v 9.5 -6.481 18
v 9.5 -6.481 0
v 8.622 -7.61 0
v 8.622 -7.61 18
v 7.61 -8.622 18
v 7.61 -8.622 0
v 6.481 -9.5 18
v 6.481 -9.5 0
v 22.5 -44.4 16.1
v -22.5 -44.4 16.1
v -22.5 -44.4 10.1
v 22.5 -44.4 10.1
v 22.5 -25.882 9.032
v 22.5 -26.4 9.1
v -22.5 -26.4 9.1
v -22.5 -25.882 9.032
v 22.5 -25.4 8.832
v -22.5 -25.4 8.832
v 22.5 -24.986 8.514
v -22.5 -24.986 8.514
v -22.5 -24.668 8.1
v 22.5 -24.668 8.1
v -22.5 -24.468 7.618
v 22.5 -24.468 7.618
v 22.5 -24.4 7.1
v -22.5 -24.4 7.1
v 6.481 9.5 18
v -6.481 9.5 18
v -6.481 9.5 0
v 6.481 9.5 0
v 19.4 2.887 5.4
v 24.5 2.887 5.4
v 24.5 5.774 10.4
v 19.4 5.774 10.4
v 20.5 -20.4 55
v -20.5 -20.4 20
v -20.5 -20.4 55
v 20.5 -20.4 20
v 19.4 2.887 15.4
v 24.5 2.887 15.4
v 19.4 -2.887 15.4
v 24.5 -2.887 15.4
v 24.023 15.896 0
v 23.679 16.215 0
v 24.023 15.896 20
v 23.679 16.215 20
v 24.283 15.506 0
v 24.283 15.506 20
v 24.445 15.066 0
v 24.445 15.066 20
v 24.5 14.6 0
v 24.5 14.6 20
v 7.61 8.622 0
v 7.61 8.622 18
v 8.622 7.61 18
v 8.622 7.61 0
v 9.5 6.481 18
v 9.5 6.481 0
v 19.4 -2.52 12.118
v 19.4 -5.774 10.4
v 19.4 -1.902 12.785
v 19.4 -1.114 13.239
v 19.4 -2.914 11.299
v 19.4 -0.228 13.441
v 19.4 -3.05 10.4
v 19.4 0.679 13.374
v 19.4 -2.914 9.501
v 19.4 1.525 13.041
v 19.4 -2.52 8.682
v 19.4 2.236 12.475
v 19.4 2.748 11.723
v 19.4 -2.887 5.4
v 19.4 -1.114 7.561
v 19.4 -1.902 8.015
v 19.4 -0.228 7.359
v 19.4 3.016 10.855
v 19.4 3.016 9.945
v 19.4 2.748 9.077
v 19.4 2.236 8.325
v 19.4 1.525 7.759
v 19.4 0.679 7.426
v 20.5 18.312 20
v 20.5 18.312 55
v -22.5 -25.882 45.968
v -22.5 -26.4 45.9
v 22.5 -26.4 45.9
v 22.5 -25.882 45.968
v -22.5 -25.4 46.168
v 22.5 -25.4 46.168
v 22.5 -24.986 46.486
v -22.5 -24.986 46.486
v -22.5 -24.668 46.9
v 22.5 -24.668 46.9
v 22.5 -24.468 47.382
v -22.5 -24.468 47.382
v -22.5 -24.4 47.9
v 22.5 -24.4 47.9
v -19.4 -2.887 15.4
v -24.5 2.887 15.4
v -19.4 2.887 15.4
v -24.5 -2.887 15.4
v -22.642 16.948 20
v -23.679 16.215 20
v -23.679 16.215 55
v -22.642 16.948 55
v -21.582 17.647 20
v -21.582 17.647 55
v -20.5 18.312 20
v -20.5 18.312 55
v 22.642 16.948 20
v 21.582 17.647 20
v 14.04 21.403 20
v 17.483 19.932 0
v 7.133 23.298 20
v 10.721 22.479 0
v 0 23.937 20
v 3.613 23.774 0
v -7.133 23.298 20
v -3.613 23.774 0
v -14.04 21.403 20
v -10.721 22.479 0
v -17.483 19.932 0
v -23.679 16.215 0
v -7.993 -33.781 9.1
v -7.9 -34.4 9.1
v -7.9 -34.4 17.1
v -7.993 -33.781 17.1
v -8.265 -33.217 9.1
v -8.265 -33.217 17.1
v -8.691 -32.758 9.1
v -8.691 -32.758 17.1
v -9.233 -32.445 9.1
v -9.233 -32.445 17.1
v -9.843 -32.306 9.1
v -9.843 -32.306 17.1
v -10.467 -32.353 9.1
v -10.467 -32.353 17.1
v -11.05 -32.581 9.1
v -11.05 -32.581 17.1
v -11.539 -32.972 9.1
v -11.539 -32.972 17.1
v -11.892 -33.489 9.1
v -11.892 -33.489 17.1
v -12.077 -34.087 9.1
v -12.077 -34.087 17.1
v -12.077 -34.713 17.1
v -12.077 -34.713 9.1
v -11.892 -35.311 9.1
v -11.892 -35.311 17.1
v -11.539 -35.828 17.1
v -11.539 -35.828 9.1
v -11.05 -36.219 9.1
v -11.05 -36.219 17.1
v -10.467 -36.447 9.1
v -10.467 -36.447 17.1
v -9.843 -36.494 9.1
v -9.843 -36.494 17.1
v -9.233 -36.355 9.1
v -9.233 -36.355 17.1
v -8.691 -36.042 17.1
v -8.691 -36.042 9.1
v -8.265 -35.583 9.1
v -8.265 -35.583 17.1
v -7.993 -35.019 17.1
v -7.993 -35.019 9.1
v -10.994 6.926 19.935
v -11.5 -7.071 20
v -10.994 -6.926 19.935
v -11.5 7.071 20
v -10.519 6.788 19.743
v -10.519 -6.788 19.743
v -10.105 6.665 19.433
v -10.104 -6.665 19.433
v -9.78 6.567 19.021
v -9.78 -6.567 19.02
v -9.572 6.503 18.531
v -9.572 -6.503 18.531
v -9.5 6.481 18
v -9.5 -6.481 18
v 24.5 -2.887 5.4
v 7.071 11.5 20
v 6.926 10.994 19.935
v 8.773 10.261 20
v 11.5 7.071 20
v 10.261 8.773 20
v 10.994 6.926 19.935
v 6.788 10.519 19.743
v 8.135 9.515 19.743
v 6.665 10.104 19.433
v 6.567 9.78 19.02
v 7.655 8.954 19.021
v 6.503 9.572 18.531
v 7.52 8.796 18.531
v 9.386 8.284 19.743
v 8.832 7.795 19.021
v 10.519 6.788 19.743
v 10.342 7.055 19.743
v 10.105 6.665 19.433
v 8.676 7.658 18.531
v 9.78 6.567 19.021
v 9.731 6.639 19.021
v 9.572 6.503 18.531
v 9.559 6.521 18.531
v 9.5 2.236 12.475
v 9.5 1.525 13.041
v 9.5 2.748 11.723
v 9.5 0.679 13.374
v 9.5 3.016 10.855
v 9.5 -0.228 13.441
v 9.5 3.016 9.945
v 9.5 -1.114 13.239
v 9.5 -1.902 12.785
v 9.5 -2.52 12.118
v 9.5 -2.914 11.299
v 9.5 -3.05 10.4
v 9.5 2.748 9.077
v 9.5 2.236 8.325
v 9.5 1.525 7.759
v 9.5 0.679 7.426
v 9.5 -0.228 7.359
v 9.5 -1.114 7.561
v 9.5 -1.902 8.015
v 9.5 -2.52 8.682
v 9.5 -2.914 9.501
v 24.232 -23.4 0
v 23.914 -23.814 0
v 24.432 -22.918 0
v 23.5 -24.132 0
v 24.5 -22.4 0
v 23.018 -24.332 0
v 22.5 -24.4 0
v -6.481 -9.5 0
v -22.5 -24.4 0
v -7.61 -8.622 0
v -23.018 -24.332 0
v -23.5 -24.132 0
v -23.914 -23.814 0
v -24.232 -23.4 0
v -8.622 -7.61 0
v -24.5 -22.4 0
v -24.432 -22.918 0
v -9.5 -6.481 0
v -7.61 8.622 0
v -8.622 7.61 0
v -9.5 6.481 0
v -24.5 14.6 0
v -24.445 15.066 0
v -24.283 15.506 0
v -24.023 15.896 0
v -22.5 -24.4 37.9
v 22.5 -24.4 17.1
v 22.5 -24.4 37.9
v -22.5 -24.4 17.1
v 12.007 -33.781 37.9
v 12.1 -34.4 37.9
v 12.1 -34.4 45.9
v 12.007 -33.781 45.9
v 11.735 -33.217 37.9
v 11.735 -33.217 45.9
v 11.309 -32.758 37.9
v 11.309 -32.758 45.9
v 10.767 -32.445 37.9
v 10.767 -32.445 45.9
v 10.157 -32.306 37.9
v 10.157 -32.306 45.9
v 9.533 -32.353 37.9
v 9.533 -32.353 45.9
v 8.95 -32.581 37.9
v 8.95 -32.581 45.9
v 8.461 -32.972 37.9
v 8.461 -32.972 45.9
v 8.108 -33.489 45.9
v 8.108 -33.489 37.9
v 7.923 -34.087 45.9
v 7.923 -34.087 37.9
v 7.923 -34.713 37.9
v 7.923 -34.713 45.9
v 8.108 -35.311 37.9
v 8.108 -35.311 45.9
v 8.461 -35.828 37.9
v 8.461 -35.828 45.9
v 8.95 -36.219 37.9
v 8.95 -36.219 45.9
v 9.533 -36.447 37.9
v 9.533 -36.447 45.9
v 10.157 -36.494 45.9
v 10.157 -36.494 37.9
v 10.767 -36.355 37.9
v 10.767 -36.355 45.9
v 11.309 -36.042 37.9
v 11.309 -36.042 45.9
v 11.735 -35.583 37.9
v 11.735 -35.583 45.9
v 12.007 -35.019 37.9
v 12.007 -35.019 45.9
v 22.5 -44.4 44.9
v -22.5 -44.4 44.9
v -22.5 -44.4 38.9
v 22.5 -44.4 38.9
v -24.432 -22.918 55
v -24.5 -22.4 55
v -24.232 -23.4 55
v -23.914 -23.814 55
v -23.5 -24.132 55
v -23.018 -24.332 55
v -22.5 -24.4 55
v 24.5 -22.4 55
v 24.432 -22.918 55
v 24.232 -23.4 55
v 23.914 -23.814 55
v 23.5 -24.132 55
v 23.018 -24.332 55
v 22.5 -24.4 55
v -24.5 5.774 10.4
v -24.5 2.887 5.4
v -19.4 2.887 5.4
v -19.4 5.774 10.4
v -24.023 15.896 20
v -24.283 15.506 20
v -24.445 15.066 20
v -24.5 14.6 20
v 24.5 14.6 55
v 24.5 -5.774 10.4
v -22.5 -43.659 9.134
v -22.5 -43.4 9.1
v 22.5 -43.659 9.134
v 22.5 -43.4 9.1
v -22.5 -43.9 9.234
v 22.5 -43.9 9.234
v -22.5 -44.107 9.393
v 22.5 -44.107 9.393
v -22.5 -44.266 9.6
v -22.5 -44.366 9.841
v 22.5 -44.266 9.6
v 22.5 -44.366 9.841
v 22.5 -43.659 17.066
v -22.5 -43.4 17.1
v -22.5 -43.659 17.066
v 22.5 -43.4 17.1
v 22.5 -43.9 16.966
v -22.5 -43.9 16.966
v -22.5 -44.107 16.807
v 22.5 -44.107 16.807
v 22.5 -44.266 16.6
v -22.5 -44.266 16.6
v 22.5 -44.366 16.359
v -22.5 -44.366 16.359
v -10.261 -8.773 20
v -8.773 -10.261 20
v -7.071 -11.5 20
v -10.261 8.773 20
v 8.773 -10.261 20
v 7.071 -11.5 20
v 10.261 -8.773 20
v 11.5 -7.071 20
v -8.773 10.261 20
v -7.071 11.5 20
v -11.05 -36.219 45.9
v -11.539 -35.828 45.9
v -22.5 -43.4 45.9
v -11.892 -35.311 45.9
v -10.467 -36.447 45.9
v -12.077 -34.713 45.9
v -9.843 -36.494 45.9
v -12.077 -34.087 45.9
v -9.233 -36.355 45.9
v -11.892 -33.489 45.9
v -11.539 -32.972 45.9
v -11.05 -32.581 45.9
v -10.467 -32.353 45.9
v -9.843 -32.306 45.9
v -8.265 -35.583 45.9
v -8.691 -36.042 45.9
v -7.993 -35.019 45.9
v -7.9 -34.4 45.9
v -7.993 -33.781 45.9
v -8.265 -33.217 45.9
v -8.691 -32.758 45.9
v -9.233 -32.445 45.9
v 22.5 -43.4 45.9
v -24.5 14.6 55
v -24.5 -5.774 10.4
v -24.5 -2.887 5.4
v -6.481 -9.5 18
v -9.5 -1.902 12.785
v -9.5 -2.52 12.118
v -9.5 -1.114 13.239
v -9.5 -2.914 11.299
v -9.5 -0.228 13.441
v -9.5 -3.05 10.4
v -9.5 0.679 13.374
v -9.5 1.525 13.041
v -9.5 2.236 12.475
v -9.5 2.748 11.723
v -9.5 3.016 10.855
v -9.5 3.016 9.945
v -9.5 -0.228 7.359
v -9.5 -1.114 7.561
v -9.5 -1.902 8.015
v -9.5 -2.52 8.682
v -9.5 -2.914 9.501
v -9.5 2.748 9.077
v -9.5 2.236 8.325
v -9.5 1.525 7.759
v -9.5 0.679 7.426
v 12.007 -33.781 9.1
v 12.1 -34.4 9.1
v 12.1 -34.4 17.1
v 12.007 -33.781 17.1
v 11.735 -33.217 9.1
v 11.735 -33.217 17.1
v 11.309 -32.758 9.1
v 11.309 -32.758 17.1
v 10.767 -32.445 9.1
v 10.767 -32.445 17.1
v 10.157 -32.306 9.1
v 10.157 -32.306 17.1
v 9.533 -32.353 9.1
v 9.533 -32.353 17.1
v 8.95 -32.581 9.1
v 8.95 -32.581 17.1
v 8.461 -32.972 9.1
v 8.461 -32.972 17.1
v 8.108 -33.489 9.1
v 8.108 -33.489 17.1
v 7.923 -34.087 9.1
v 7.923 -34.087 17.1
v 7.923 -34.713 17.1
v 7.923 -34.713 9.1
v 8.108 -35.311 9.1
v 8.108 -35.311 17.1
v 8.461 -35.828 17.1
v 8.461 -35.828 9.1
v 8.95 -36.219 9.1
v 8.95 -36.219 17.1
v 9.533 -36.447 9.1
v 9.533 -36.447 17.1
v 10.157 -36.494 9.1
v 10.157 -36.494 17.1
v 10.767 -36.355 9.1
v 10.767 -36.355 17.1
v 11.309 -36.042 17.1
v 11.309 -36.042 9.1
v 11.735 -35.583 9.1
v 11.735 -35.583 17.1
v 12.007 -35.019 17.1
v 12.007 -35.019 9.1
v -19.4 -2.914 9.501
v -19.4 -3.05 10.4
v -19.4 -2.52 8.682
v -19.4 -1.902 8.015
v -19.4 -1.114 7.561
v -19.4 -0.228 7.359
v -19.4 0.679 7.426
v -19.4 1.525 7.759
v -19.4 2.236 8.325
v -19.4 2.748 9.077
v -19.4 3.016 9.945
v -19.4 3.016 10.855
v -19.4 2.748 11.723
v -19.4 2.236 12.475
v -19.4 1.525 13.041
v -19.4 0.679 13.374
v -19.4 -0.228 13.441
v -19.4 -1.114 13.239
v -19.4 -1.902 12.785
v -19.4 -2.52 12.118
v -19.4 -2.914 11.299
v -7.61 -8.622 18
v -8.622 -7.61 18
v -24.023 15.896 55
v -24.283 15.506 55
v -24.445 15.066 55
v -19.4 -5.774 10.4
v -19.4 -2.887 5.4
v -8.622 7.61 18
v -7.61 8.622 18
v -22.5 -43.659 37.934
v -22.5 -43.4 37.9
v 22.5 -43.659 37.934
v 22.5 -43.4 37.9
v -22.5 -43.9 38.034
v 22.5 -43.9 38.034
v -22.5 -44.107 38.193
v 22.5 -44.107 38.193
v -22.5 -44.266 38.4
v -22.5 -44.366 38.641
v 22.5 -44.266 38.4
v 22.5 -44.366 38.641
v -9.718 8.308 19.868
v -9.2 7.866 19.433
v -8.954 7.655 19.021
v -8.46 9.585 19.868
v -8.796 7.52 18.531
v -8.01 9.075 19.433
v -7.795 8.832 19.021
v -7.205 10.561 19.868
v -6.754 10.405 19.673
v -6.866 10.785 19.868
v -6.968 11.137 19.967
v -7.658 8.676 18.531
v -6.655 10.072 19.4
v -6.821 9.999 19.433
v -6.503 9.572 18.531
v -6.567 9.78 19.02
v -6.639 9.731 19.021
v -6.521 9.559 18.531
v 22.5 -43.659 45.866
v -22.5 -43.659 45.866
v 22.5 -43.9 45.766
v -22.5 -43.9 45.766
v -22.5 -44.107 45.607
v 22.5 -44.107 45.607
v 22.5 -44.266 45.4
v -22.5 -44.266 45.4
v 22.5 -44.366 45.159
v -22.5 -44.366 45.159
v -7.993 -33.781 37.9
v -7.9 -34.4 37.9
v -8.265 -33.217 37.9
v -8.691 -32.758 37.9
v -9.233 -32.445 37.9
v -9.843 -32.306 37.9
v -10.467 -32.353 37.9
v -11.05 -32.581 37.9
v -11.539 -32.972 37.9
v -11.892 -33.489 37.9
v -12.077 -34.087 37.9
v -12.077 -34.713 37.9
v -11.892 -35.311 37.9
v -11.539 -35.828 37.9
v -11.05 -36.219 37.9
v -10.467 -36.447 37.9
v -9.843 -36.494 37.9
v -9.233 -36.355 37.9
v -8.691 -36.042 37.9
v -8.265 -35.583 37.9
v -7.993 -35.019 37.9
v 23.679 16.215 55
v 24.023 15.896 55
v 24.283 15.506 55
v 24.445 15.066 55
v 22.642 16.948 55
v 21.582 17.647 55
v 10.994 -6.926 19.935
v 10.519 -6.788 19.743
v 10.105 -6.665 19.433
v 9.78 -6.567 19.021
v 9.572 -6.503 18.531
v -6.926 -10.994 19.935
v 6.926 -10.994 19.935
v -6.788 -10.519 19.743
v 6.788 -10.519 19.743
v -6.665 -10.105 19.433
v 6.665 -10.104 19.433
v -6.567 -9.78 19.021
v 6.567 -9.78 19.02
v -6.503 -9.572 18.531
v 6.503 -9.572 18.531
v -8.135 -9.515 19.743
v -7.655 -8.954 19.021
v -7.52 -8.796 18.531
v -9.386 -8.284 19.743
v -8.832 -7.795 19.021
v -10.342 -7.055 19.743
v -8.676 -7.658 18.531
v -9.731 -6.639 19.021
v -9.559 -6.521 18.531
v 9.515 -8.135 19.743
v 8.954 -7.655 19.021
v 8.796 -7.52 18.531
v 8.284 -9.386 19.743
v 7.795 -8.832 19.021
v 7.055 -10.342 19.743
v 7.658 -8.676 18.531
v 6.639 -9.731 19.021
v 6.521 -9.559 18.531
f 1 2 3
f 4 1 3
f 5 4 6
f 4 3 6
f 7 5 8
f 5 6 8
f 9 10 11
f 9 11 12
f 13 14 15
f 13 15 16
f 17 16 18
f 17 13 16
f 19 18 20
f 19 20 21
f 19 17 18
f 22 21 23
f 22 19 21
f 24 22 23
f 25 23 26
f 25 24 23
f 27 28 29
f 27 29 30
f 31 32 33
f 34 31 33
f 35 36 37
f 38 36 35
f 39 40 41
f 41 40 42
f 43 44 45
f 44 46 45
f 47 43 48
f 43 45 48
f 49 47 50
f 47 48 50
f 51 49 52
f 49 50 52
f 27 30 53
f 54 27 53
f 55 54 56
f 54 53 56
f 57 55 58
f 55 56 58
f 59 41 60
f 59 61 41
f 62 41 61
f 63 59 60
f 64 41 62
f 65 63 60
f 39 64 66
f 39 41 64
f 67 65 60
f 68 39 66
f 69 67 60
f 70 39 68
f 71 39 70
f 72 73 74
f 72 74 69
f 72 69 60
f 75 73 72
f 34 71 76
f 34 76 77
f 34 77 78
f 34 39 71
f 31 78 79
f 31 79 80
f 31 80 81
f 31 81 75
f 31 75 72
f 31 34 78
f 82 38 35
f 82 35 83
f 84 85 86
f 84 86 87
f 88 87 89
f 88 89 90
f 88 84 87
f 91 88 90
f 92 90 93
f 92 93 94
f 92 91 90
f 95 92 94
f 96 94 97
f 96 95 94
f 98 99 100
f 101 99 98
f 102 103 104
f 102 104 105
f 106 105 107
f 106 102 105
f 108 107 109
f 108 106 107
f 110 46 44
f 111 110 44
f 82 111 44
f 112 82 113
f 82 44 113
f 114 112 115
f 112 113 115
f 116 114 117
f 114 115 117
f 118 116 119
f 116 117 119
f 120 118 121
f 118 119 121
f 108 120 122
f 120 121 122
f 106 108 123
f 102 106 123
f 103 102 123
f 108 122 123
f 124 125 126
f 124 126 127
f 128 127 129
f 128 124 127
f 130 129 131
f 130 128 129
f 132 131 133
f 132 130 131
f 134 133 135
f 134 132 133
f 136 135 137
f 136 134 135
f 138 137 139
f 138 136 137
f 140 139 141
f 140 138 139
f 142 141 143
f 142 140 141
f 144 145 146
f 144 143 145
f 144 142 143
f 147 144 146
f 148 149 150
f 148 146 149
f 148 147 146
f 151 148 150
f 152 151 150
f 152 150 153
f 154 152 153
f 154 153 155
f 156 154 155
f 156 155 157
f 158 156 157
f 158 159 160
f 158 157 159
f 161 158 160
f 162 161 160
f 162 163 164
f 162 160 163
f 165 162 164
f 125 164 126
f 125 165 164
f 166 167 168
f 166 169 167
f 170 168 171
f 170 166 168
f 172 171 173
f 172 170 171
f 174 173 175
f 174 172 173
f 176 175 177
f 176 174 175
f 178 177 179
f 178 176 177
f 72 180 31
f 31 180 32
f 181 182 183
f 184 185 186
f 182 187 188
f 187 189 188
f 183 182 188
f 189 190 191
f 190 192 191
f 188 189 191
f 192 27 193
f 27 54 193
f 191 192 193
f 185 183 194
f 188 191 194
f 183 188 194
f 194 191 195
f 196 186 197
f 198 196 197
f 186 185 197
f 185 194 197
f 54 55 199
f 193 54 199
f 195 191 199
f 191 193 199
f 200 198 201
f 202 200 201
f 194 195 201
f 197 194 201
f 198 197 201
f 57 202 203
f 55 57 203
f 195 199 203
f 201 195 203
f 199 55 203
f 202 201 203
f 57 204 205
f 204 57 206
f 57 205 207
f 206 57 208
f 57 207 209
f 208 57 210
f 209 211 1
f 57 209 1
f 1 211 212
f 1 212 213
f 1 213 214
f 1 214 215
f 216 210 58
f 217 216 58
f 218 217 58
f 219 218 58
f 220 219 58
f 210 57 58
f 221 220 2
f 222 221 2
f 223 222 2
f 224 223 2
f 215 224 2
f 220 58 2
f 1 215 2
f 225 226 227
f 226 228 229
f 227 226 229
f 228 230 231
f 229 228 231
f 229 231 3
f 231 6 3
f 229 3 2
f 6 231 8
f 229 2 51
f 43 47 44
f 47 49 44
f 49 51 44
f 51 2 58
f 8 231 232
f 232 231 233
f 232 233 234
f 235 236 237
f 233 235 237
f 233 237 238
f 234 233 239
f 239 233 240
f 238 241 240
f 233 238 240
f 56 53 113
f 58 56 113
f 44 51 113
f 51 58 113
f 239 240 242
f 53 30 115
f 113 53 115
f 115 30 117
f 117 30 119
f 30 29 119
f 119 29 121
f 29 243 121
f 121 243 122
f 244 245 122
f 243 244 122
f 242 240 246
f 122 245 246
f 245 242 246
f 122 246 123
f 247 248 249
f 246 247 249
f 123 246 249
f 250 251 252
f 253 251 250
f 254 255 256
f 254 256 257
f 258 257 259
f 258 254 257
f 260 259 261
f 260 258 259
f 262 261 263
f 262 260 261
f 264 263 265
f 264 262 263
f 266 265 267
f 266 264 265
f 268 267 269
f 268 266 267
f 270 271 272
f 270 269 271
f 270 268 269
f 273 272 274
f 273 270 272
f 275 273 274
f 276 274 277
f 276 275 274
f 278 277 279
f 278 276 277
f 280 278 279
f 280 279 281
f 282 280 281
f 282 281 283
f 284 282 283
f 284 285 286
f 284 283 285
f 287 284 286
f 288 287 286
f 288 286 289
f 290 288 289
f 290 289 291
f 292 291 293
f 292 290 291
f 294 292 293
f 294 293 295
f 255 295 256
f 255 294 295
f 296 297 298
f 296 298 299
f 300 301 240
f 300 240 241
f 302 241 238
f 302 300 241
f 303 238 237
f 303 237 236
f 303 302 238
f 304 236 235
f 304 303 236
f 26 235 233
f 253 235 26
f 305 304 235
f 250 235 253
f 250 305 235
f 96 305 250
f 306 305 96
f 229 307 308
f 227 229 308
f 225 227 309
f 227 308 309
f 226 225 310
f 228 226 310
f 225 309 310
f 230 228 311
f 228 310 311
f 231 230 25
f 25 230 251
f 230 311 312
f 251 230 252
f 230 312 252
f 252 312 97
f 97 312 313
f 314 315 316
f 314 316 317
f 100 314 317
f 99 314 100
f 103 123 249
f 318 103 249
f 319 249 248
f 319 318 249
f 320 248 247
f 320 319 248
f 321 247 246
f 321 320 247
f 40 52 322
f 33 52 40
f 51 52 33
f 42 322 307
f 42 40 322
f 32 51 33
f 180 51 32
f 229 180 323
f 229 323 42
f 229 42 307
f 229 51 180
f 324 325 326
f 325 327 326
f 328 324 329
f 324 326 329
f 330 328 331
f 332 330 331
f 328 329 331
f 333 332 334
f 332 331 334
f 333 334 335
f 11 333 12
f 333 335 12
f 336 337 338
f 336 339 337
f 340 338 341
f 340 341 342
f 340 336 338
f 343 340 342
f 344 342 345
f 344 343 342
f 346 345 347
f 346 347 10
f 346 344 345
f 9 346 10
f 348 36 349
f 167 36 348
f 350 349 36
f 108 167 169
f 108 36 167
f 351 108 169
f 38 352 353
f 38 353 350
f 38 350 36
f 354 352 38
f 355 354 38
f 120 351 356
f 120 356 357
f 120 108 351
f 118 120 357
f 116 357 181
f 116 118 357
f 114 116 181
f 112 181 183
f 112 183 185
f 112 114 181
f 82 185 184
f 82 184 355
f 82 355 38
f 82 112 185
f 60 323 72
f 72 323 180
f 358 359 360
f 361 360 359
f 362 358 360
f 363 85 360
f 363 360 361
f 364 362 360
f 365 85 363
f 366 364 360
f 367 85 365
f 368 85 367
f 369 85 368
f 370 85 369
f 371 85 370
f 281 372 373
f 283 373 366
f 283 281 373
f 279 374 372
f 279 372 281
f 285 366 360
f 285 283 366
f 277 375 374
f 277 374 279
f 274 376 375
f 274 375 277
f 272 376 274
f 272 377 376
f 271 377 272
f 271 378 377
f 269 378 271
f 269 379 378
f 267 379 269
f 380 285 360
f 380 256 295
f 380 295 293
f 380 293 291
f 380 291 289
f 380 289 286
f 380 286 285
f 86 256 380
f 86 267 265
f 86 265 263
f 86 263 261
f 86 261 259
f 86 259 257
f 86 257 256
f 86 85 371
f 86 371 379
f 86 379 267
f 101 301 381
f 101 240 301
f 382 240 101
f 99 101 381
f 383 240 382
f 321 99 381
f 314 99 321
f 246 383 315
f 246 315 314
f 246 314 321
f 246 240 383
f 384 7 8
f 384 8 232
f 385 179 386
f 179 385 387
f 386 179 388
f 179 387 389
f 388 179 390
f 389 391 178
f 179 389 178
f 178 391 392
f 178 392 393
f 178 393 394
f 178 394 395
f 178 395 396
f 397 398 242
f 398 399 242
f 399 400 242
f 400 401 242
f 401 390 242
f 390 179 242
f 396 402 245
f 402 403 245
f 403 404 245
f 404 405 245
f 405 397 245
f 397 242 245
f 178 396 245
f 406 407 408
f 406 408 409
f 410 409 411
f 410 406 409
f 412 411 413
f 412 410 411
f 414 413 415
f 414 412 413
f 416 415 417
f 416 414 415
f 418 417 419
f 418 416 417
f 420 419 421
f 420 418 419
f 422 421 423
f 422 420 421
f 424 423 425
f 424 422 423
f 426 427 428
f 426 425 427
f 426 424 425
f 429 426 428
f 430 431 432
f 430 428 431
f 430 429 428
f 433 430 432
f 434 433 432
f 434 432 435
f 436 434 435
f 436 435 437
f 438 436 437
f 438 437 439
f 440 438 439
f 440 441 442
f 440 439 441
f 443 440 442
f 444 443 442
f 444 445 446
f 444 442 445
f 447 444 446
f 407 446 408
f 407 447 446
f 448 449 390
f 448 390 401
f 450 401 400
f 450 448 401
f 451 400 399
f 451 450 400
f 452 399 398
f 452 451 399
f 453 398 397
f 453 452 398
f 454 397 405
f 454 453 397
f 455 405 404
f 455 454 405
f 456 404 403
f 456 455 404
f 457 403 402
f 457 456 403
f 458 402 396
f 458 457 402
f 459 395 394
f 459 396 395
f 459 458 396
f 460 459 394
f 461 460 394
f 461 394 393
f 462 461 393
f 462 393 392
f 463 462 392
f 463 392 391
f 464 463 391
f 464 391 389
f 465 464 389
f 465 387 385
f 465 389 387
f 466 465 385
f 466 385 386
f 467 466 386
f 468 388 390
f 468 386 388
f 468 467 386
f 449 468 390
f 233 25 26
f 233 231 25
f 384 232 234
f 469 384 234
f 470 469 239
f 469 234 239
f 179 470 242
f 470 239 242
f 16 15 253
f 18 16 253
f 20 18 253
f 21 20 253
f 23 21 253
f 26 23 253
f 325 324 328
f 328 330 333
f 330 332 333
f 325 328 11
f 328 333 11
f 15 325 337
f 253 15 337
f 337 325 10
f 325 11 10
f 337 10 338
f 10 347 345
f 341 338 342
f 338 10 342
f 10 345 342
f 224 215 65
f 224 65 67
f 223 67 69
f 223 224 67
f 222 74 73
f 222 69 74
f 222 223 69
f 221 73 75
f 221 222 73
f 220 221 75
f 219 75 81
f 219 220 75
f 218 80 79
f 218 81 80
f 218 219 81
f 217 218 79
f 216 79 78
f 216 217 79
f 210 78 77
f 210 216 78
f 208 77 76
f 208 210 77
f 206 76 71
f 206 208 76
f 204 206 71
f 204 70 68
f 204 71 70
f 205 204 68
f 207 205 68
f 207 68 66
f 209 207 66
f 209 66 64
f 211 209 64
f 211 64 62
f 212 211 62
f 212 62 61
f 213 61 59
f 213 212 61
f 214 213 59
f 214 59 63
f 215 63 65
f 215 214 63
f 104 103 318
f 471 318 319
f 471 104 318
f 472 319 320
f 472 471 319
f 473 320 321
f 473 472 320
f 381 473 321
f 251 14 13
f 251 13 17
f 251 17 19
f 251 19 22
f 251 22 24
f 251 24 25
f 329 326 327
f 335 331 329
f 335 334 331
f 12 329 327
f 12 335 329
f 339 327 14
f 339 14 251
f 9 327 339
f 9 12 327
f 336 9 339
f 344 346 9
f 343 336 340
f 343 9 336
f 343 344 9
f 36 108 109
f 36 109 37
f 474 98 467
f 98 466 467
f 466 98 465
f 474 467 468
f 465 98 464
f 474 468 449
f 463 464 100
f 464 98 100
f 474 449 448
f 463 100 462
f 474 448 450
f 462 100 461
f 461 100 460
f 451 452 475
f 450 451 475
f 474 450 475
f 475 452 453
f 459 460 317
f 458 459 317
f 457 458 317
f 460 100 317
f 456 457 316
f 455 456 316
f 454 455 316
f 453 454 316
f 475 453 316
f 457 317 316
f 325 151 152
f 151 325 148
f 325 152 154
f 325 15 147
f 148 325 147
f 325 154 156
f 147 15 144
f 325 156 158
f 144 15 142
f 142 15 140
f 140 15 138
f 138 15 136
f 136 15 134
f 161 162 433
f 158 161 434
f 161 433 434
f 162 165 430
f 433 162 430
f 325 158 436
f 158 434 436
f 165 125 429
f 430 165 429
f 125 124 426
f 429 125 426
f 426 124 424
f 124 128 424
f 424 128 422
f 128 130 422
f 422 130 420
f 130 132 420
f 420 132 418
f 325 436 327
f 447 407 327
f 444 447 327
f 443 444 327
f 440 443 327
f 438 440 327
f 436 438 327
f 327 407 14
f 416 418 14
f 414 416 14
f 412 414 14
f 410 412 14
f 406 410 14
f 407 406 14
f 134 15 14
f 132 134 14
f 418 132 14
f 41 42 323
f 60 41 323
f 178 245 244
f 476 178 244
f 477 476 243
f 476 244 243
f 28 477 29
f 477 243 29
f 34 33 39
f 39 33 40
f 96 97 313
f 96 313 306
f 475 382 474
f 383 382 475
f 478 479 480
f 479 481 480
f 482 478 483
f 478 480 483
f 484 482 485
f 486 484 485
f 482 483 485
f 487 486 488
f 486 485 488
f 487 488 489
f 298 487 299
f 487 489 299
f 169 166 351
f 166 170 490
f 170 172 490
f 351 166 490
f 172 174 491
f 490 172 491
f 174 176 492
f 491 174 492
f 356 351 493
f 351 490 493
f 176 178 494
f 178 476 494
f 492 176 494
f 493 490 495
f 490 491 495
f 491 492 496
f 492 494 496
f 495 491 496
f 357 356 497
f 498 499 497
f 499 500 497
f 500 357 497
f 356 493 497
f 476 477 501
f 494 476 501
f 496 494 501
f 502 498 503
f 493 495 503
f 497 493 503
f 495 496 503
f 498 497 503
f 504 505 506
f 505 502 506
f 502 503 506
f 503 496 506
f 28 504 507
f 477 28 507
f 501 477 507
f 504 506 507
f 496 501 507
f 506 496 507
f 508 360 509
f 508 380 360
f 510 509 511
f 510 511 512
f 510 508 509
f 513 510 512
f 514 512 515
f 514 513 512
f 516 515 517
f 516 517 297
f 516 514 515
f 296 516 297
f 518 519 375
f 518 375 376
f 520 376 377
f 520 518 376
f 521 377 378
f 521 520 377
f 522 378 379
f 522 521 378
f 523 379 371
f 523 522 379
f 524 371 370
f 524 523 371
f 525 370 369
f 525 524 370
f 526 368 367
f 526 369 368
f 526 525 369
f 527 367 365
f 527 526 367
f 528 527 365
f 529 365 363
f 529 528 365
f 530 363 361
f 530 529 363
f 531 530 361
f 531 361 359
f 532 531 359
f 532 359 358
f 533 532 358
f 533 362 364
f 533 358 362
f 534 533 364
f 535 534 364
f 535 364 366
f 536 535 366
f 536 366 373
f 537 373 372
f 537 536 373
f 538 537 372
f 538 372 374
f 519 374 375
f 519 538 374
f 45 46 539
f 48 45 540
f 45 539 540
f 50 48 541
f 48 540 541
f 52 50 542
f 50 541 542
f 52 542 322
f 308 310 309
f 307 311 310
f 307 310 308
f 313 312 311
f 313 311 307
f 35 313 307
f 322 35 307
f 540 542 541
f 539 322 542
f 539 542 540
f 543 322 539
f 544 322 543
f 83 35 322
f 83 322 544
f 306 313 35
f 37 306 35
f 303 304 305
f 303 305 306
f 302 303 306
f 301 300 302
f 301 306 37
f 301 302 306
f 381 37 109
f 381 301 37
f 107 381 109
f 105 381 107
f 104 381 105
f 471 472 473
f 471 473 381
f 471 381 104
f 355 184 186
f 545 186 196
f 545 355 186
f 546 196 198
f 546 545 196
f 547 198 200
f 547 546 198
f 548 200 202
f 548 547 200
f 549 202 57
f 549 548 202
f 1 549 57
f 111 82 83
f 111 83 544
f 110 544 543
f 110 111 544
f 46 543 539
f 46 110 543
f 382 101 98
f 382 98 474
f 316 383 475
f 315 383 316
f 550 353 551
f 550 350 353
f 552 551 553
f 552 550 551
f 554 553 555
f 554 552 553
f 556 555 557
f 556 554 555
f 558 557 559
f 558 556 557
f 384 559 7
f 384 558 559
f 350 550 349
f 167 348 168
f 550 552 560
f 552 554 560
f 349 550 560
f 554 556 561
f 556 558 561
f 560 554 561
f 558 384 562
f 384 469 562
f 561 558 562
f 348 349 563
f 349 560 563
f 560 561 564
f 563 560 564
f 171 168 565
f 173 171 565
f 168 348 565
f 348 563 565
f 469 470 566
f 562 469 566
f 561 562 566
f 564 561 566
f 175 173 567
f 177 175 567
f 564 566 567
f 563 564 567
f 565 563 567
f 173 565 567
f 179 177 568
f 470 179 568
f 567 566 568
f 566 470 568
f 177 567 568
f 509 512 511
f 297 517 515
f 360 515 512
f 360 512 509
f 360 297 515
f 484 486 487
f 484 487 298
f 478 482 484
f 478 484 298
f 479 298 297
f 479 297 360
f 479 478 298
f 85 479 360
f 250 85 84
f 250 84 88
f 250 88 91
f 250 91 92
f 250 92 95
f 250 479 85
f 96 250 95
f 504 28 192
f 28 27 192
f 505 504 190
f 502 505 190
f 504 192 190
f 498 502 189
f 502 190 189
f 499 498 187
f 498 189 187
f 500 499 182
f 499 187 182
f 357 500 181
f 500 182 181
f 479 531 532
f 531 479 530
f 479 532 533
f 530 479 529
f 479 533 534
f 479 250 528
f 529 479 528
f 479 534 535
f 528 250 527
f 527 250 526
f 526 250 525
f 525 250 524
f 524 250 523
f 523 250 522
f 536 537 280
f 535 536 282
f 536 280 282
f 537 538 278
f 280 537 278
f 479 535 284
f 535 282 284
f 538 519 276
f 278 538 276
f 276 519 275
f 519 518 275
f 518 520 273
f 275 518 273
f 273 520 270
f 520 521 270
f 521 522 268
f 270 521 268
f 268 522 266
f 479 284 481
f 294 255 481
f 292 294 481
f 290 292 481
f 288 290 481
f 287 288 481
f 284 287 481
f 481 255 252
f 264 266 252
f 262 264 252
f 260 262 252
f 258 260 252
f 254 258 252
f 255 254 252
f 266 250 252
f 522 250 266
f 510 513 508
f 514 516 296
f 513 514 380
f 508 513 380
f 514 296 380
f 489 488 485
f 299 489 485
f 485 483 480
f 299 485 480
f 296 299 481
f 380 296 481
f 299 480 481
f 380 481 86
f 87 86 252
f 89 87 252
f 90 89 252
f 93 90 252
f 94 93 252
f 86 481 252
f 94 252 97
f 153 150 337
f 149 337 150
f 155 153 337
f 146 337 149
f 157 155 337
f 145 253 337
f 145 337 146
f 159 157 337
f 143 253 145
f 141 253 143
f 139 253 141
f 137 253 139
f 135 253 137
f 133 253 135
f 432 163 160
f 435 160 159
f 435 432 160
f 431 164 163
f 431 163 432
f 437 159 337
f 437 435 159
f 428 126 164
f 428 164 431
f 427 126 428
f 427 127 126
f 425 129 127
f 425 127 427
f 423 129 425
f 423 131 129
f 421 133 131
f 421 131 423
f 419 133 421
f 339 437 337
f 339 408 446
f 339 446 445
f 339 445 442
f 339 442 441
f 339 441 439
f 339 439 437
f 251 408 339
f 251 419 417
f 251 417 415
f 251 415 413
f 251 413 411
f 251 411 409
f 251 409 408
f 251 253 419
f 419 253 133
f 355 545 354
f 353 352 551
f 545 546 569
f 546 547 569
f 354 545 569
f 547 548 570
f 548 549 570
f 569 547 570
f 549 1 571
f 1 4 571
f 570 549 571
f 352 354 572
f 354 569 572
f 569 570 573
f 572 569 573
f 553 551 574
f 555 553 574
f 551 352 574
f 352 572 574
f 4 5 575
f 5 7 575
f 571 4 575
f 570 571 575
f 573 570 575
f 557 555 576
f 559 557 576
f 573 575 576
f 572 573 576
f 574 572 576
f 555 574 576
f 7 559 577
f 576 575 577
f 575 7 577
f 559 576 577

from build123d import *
from build123d.topology import SkipClean

# Parameters (mm, degrees)
EXTRUDE_1_DEPTH          = 20
EXTRUDE_2_DEPTH          = 35
FILLET_1_R               = 2
FILLET_2_R               = 2
SKETCH_3_W               = 55
SKETCH_3_H               = 8
EXTRUDE_3_DEPTH          = 20
CUT_EXTRUDE_1_DEPTH      = 81.785122448
FILLET_3_R               = 2
CUT_EXTRUDE_2_DEPTH      = 92.549767886
CUT_EXTRUDE_2_DEPTH_BACK = 92.549767886
SKETCH_6_R               = 3.05
CUT_EXTRUDE_3_DEPTH      = 5.1
FILLET_3_OF_MIRROR_1_R   = 2
CUT_EXTRUDE_4_DEPTH      = 75.837223358
CUT_EXTRUDE_4_DEPTH_BACK = 75.837223358
SKETCH_9_R               = 1.6
SKETCH_10_R              = 3
CUT_EXTRUDE_5_DEPTH      = 3
CUT_EXTRUDE_START        = -2
SKETCH_11_R              = 3
CUT_EXTRUDE_6_DEPTH      = 2
CUT_EXTRUDE_7_DEPTH      = 75.837223358
CUT_EXTRUDE_7_DEPTH_BACK = 75.837223358
SKETCH_12_W              = 29.59816484
SKETCH_12_H              = 37.248372047
SKETCH_12_W_2            = 30.6542071
SKETCH_12_H_2            = 41.472541085
SKETCH_13_W              = 45
SKETCH_13_H              = 8
EXTRUDE_4_DEPTH          = 20
CUT_EXTRUDE_8_DEPTH      = 69.398976601
CUT_EXTRUDE_8_DEPTH_BACK = 69.398976601
SKETCH_14_R              = 2.1
FILLET_5_R               = 1
FILLET_6_R               = 2


with BuildPart() as part:
    # 草图1 → 凸台-拉伸1 (new body)
    with BuildSketch(Plane.XY):
        with BuildLine():
            Line((-24.5, -24.4), (24.5, -24.4))
            Line((24.5, -24.4), (24.5, 15.6))
            ThreePointArc((24.5, 15.6), (0, 23.936691271), (-24.5, 15.6))
            Line((-24.5, 15.6), (-24.5, -24.4))
        make_face()
        with BuildLine():
            Line((-6.480740698, 9.5), (6.480740698, 9.5))
            ThreePointArc((6.480740698, 9.5), (8.131727984, 8.131727984), (9.5, 6.480740698))
            Line((9.5, 6.480740698), (9.5, -6.480740698))
            ThreePointArc((9.5, -6.480740698), (8.131727984, -8.131727984), (6.480740698, -9.5))
            Line((6.480740698, -9.5), (-6.480740698, -9.5))
            ThreePointArc((-6.480740698, -9.5), (-8.131727984, -8.131727984), (-9.5, -6.480740698))
            Line((-9.5, -6.480740698), (-9.5, 6.480740698))
            ThreePointArc((-9.5, 6.480740698), (-8.131727984, 8.131727984), (-6.480740698, 9.5))
        make_face(mode=Mode.SUBTRACT)
    extrude(amount=EXTRUDE_1_DEPTH)

    # 草图2 → 凸台-拉伸2 (add)
    with SkipClean():  # the faces are left unmerged after this step: merging them gives an invalid solid
        with BuildSketch(Plane.XY.offset(20)):
            with BuildLine():
                Line((-20.5, 18.311818868), (-20.5, -20.4))
                Line((-20.5, -20.4), (20.5, -20.4))
                Line((20.5, -20.4), (20.5, 18.311818868))
                ThreePointArc((20.5, 18.311818868), (22.540818317, 17.016117462), (24.5, 15.6))
                Line((24.5, 15.6), (24.5, -24.4))
                Line((24.5, -24.4), (-24.5, -24.4))
                Line((-24.5, -24.4), (-24.5, 15.6))
                ThreePointArc((-24.5, 15.6), (-22.540818317, 17.016117462), (-20.5, 18.311818868))
            make_face()
        extrude(amount=EXTRUDE_2_DEPTH)

    # 圆角1
    fillet_1_edges = [part.edges().sort_by_distance(p)[0] for p in [
        (-24.5, 15.6, 37.5),
        (24.5, 15.6, 37.5),
        (24.5, -24.4, 37.5),
        (-24.5, -24.4, 37.5),
    ]]
    fillet(fillet_1_edges, radius=FILLET_1_R)

    # 圆角2
    fillet_2_edges = [part.edges().sort_by_distance(p)[0] for p in [
        (8.131727984, 8.131727984, 20),
        (0, 9.5, 20),
        (-8.131727984, 8.131727984, 20),
        (-9.5, 0, 20),
        (-8.131727984, -8.131727984, 20),
        (0, -9.5, 20),
        (8.131727984, -8.131727984, 20),
        (9.5, 0, 20),
    ]]
    fillet(fillet_2_edges, radius=FILLET_2_R)

    # 草图3 → 凸台-拉伸3 (add)
    with SkipClean():  # the faces are left unmerged after this step: merging them gives an invalid solid
        with BuildSketch(Plane.ZY.offset(24.5)):
            with Locations((27.5, 10.599820628)):
                Rectangle(SKETCH_3_W, SKETCH_3_H)
            with Locations((27.5, -18.000179372)):
                Rectangle(SKETCH_3_W, SKETCH_3_H)
        extrude_3 = extrude(amount=EXTRUDE_3_DEPTH)

    # 草图4 → 切除-拉伸1 (cut, symmetric)
    with SkipClean():  # the faces are left unmerged after this step: merging them gives an invalid solid
        with BuildSketch(Plane(origin=(0, 14.599820628, 0), x_dir=(1, 0, 0), z_dir=(0, 1, 0))):
            with BuildLine():
                Line((-39.25, -11.75), (-29.75, -11.75))
                ThreePointArc((-29.75, -11.75), (-29.042893219, -12.042893219), (-28.75, -12.75))
                Line((-28.75, -12.75), (-28.75, -17.25))
                ThreePointArc((-28.75, -17.25), (-29.042893219, -17.957106781), (-29.75, -18.25))
                Line((-29.75, -18.25), (-39.25, -18.25))
                ThreePointArc((-39.25, -18.25), (-39.957106781, -17.957106781), (-40.25, -17.25))
                Line((-40.25, -17.25), (-40.25, -12.75))
                ThreePointArc((-40.25, -12.75), (-39.957106781, -12.042893219), (-39.25, -11.75))
            make_face()
            with BuildLine():
                Line((-39.25, -36.75), (-29.75, -36.75))
                ThreePointArc((-29.75, -36.75), (-29.042893219, -37.042893219), (-28.75, -37.75))
                Line((-28.75, -37.75), (-28.75, -42.25))
                ThreePointArc((-28.75, -42.25), (-29.042893219, -42.957106781), (-29.75, -43.25))
                Line((-29.75, -43.25), (-39.25, -43.25))
                ThreePointArc((-39.25, -43.25), (-39.957106781, -42.957106781), (-40.25, -42.25))
                Line((-40.25, -42.25), (-40.25, -37.75))
                ThreePointArc((-40.25, -37.75), (-39.957106781, -37.042893219), (-39.25, -36.75))
            make_face()
        cut_extrude_1 = extrude(amount=CUT_EXTRUDE_1_DEPTH, both=True, mode=Mode.SUBTRACT)

    # 圆角3
    fillet_3_edges = [part.edges().sort_by_distance(p)[0] for p in [
        (-44.5, 6.599820628, 27.5),
        (-44.5, 14.599820628, 27.5),
        (-44.5, -14.000179372, 27.5),
        (-44.5, -22.000179372, 27.5),
    ]]
    fillet(fillet_3_edges, radius=FILLET_3_R)

    # 草图6 → 切除-拉伸2 (cut, two sides: drawn at the far end of the back side and taken through both)
    with BuildSketch(Plane(origin=(24.5, 0, 0), x_dir=(0, 0, -1), z_dir=(1, 0, 0)).offset(-CUT_EXTRUDE_2_DEPTH_BACK)):
        with Locations(Location((-10.4, 0, 0), (0, 0, 270))):
            Circle(SKETCH_6_R)
    extrude(amount=CUT_EXTRUDE_2_DEPTH + CUT_EXTRUDE_2_DEPTH_BACK, mode=Mode.SUBTRACT)

    # 草图7 → 切除-拉伸3 (cut)
    with BuildSketch(Plane(origin=(24.5, 0, 0), x_dir=(0, 0, -1), z_dir=(1, 0, 0))):
        Polygon((-5.4, -2.886751346), (-5.4, 2.886751346), (-10.4, 5.773502692), (-15.4, 2.886751346), (-15.4, -2.886751346), (-10.4, -5.773502692), align=None)
    cut_extrude_3 = extrude(amount=-CUT_EXTRUDE_3_DEPTH, mode=Mode.SUBTRACT)

    # 镜向1: 凸台-拉伸3, 切除-拉伸1, 切除-拉伸3 across plane
    add(extrude_3.mirror(Plane(origin=(0, 0, 0), x_dir=(0, 0, 1), z_dir=(1, 0, 0))))
    add(cut_extrude_1.mirror(Plane(origin=(0, 0, 0), x_dir=(0, 0, 1), z_dir=(1, 0, 0))), mode=Mode.SUBTRACT)
    add(cut_extrude_3.mirror(Plane(origin=(0, 0, 0), x_dir=(0, 0, 1), z_dir=(1, 0, 0))), mode=Mode.SUBTRACT)

    # 圆角3 of 镜向1
    fillet_3_of_mirror_1_edges = [part.edges().sort_by_distance(p)[0] for p in [
        (44.5, 6.599820628, 27.5),
        (44.5, 14.599820628, 27.5),
        (44.5, -14.000179372, 27.5),
        (44.5, -22.000179372, 27.5),
    ]]
    fillet(fillet_3_of_mirror_1_edges, radius=FILLET_3_OF_MIRROR_1_R)

    # 草图9 → 切除-拉伸4 (cut, two sides: drawn at the far end of the back side and taken through both)
    with BuildSketch(Plane(origin=(0, 0, 0), x_dir=(-1, 0, 0), z_dir=(0, 0, -1)).offset(-CUT_EXTRUDE_4_DEPTH_BACK)):
        with Locations((34.5, -18.000179372)):
            Circle(SKETCH_9_R)
        with Locations((34.5, 10.599820628)):
            Circle(SKETCH_9_R)
        with Locations((-34.5, 10.599820628)):
            Circle(SKETCH_9_R)
        with Locations((-34.5, -18.000179372)):
            Circle(SKETCH_9_R)
    extrude(amount=CUT_EXTRUDE_4_DEPTH + CUT_EXTRUDE_4_DEPTH_BACK, mode=Mode.SUBTRACT)

    # 草图10 → 切除-拉伸5 (cut)
    with BuildSketch(Plane(origin=(0, 0, 0), x_dir=(-1, 0, 0), z_dir=(0, 0, -1))):
        with Locations((34.5, 10.599820628)):
            Circle(SKETCH_10_R)
        with Locations((34.5, -18.000179372)):
            Circle(SKETCH_10_R)
        with Locations((-34.5, -18.000179372)):
            Circle(SKETCH_10_R)
        with Locations((-34.5, 10.599820628)):
            Circle(SKETCH_10_R)
    extrude(amount=-CUT_EXTRUDE_5_DEPTH, mode=Mode.SUBTRACT)

    # 草图11 → 切除-拉伸6 (cut)
    with BuildSketch(Plane.XY.offset(55).offset(CUT_EXTRUDE_START)):
        with Locations(Location((34.5, 10.599820628, 0), (0, 0, 180))):
            Circle(SKETCH_11_R)
        with Locations(Location((34.5, -18.000179372, 0), (0, 0, 180))):
            Circle(SKETCH_11_R)
        with Locations(Location((-34.5, -18.000179372, 0), (0, 0, 180))):
            Circle(SKETCH_11_R)
        with Locations(Location((-34.5, 10.599820628, 0), (0, 0, 180))):
            Circle(SKETCH_11_R)
    extrude(amount=CUT_EXTRUDE_6_DEPTH, mode=Mode.SUBTRACT)

    # 草图12 → 切除-拉伸7 (cut, two sides: drawn at the far end of the back side and taken through both)
    with BuildSketch(Plane(origin=(0, 0, 0), x_dir=(-1, 0, 0), z_dir=(0, 0, -1)).offset(-CUT_EXTRUDE_7_DEPTH_BACK)):
        with Locations((-39.29908242, -4.024365395)):
            Rectangle(SKETCH_12_W, SKETCH_12_H)
        with Locations((39.82710355, -6.136449915)):
            Rectangle(SKETCH_12_W_2, SKETCH_12_H_2)
    extrude(amount=CUT_EXTRUDE_7_DEPTH + CUT_EXTRUDE_7_DEPTH_BACK, mode=Mode.SUBTRACT)

    # 草图13 → 凸台-拉伸4 (add)
    with BuildSketch(Plane.XZ.offset(24.4)):
        with Locations((0, 41.9)):
            Rectangle(SKETCH_13_W, SKETCH_13_H)
        with Locations((0, 13.1)):
            Rectangle(SKETCH_13_W, SKETCH_13_H)
    extrude(amount=EXTRUDE_4_DEPTH)

    # 草图14 → 切除-拉伸8 (cut, two sides: drawn at the far end of the back side and taken through both)
    with BuildSketch(Plane.XY.offset(45.9).offset(-CUT_EXTRUDE_8_DEPTH_BACK)):
        with Locations((-10, -34.4)):
            Circle(SKETCH_14_R)
        with Locations((10, -34.4)):
            Circle(SKETCH_14_R)
    extrude(amount=CUT_EXTRUDE_8_DEPTH + CUT_EXTRUDE_8_DEPTH_BACK, mode=Mode.SUBTRACT)

    # 圆角5
    fillet_5_edges = [part.edges().sort_by_distance(p)[0] for p in [
        (0, -44.4, 37.9),
        (0, -44.4, 45.9),
        (0, -44.4, 9.1),
        (0, -44.4, 17.1),
    ]]
    fillet(fillet_5_edges, radius=FILLET_5_R)

    # 圆角6
    # the kernel refuses this fillet: 2 mm, written as the material it adds along each edge
    with BuildSketch(Plane(origin=(-22.5, -24.4, 45.9), x_dir=(0, -1, 0), z_dir=(1, 0, 0))) as fillet_6_piece_1:
        with BuildLine():
            CenterArc((FILLET_6_R, -FILLET_6_R), FILLET_6_R, 90, 90)
            Line((0, -FILLET_6_R), (0, 0))
            Line((0, 0), (FILLET_6_R, 0))
        make_face()
    extrude(amount=45)
    with BuildSketch(Plane(origin=(22.5, -24.4, 9.1), x_dir=(0, 0, -1), z_dir=(-1, 0, 0))) as fillet_6_piece_2:
        with BuildLine():
            CenterArc((FILLET_6_R, FILLET_6_R), FILLET_6_R, 180, 90)
            Line((0, FILLET_6_R), (0, 0))
            Line((0, 0), (FILLET_6_R, 0))
        make_face()
    extrude(amount=45)


solid = part.part
